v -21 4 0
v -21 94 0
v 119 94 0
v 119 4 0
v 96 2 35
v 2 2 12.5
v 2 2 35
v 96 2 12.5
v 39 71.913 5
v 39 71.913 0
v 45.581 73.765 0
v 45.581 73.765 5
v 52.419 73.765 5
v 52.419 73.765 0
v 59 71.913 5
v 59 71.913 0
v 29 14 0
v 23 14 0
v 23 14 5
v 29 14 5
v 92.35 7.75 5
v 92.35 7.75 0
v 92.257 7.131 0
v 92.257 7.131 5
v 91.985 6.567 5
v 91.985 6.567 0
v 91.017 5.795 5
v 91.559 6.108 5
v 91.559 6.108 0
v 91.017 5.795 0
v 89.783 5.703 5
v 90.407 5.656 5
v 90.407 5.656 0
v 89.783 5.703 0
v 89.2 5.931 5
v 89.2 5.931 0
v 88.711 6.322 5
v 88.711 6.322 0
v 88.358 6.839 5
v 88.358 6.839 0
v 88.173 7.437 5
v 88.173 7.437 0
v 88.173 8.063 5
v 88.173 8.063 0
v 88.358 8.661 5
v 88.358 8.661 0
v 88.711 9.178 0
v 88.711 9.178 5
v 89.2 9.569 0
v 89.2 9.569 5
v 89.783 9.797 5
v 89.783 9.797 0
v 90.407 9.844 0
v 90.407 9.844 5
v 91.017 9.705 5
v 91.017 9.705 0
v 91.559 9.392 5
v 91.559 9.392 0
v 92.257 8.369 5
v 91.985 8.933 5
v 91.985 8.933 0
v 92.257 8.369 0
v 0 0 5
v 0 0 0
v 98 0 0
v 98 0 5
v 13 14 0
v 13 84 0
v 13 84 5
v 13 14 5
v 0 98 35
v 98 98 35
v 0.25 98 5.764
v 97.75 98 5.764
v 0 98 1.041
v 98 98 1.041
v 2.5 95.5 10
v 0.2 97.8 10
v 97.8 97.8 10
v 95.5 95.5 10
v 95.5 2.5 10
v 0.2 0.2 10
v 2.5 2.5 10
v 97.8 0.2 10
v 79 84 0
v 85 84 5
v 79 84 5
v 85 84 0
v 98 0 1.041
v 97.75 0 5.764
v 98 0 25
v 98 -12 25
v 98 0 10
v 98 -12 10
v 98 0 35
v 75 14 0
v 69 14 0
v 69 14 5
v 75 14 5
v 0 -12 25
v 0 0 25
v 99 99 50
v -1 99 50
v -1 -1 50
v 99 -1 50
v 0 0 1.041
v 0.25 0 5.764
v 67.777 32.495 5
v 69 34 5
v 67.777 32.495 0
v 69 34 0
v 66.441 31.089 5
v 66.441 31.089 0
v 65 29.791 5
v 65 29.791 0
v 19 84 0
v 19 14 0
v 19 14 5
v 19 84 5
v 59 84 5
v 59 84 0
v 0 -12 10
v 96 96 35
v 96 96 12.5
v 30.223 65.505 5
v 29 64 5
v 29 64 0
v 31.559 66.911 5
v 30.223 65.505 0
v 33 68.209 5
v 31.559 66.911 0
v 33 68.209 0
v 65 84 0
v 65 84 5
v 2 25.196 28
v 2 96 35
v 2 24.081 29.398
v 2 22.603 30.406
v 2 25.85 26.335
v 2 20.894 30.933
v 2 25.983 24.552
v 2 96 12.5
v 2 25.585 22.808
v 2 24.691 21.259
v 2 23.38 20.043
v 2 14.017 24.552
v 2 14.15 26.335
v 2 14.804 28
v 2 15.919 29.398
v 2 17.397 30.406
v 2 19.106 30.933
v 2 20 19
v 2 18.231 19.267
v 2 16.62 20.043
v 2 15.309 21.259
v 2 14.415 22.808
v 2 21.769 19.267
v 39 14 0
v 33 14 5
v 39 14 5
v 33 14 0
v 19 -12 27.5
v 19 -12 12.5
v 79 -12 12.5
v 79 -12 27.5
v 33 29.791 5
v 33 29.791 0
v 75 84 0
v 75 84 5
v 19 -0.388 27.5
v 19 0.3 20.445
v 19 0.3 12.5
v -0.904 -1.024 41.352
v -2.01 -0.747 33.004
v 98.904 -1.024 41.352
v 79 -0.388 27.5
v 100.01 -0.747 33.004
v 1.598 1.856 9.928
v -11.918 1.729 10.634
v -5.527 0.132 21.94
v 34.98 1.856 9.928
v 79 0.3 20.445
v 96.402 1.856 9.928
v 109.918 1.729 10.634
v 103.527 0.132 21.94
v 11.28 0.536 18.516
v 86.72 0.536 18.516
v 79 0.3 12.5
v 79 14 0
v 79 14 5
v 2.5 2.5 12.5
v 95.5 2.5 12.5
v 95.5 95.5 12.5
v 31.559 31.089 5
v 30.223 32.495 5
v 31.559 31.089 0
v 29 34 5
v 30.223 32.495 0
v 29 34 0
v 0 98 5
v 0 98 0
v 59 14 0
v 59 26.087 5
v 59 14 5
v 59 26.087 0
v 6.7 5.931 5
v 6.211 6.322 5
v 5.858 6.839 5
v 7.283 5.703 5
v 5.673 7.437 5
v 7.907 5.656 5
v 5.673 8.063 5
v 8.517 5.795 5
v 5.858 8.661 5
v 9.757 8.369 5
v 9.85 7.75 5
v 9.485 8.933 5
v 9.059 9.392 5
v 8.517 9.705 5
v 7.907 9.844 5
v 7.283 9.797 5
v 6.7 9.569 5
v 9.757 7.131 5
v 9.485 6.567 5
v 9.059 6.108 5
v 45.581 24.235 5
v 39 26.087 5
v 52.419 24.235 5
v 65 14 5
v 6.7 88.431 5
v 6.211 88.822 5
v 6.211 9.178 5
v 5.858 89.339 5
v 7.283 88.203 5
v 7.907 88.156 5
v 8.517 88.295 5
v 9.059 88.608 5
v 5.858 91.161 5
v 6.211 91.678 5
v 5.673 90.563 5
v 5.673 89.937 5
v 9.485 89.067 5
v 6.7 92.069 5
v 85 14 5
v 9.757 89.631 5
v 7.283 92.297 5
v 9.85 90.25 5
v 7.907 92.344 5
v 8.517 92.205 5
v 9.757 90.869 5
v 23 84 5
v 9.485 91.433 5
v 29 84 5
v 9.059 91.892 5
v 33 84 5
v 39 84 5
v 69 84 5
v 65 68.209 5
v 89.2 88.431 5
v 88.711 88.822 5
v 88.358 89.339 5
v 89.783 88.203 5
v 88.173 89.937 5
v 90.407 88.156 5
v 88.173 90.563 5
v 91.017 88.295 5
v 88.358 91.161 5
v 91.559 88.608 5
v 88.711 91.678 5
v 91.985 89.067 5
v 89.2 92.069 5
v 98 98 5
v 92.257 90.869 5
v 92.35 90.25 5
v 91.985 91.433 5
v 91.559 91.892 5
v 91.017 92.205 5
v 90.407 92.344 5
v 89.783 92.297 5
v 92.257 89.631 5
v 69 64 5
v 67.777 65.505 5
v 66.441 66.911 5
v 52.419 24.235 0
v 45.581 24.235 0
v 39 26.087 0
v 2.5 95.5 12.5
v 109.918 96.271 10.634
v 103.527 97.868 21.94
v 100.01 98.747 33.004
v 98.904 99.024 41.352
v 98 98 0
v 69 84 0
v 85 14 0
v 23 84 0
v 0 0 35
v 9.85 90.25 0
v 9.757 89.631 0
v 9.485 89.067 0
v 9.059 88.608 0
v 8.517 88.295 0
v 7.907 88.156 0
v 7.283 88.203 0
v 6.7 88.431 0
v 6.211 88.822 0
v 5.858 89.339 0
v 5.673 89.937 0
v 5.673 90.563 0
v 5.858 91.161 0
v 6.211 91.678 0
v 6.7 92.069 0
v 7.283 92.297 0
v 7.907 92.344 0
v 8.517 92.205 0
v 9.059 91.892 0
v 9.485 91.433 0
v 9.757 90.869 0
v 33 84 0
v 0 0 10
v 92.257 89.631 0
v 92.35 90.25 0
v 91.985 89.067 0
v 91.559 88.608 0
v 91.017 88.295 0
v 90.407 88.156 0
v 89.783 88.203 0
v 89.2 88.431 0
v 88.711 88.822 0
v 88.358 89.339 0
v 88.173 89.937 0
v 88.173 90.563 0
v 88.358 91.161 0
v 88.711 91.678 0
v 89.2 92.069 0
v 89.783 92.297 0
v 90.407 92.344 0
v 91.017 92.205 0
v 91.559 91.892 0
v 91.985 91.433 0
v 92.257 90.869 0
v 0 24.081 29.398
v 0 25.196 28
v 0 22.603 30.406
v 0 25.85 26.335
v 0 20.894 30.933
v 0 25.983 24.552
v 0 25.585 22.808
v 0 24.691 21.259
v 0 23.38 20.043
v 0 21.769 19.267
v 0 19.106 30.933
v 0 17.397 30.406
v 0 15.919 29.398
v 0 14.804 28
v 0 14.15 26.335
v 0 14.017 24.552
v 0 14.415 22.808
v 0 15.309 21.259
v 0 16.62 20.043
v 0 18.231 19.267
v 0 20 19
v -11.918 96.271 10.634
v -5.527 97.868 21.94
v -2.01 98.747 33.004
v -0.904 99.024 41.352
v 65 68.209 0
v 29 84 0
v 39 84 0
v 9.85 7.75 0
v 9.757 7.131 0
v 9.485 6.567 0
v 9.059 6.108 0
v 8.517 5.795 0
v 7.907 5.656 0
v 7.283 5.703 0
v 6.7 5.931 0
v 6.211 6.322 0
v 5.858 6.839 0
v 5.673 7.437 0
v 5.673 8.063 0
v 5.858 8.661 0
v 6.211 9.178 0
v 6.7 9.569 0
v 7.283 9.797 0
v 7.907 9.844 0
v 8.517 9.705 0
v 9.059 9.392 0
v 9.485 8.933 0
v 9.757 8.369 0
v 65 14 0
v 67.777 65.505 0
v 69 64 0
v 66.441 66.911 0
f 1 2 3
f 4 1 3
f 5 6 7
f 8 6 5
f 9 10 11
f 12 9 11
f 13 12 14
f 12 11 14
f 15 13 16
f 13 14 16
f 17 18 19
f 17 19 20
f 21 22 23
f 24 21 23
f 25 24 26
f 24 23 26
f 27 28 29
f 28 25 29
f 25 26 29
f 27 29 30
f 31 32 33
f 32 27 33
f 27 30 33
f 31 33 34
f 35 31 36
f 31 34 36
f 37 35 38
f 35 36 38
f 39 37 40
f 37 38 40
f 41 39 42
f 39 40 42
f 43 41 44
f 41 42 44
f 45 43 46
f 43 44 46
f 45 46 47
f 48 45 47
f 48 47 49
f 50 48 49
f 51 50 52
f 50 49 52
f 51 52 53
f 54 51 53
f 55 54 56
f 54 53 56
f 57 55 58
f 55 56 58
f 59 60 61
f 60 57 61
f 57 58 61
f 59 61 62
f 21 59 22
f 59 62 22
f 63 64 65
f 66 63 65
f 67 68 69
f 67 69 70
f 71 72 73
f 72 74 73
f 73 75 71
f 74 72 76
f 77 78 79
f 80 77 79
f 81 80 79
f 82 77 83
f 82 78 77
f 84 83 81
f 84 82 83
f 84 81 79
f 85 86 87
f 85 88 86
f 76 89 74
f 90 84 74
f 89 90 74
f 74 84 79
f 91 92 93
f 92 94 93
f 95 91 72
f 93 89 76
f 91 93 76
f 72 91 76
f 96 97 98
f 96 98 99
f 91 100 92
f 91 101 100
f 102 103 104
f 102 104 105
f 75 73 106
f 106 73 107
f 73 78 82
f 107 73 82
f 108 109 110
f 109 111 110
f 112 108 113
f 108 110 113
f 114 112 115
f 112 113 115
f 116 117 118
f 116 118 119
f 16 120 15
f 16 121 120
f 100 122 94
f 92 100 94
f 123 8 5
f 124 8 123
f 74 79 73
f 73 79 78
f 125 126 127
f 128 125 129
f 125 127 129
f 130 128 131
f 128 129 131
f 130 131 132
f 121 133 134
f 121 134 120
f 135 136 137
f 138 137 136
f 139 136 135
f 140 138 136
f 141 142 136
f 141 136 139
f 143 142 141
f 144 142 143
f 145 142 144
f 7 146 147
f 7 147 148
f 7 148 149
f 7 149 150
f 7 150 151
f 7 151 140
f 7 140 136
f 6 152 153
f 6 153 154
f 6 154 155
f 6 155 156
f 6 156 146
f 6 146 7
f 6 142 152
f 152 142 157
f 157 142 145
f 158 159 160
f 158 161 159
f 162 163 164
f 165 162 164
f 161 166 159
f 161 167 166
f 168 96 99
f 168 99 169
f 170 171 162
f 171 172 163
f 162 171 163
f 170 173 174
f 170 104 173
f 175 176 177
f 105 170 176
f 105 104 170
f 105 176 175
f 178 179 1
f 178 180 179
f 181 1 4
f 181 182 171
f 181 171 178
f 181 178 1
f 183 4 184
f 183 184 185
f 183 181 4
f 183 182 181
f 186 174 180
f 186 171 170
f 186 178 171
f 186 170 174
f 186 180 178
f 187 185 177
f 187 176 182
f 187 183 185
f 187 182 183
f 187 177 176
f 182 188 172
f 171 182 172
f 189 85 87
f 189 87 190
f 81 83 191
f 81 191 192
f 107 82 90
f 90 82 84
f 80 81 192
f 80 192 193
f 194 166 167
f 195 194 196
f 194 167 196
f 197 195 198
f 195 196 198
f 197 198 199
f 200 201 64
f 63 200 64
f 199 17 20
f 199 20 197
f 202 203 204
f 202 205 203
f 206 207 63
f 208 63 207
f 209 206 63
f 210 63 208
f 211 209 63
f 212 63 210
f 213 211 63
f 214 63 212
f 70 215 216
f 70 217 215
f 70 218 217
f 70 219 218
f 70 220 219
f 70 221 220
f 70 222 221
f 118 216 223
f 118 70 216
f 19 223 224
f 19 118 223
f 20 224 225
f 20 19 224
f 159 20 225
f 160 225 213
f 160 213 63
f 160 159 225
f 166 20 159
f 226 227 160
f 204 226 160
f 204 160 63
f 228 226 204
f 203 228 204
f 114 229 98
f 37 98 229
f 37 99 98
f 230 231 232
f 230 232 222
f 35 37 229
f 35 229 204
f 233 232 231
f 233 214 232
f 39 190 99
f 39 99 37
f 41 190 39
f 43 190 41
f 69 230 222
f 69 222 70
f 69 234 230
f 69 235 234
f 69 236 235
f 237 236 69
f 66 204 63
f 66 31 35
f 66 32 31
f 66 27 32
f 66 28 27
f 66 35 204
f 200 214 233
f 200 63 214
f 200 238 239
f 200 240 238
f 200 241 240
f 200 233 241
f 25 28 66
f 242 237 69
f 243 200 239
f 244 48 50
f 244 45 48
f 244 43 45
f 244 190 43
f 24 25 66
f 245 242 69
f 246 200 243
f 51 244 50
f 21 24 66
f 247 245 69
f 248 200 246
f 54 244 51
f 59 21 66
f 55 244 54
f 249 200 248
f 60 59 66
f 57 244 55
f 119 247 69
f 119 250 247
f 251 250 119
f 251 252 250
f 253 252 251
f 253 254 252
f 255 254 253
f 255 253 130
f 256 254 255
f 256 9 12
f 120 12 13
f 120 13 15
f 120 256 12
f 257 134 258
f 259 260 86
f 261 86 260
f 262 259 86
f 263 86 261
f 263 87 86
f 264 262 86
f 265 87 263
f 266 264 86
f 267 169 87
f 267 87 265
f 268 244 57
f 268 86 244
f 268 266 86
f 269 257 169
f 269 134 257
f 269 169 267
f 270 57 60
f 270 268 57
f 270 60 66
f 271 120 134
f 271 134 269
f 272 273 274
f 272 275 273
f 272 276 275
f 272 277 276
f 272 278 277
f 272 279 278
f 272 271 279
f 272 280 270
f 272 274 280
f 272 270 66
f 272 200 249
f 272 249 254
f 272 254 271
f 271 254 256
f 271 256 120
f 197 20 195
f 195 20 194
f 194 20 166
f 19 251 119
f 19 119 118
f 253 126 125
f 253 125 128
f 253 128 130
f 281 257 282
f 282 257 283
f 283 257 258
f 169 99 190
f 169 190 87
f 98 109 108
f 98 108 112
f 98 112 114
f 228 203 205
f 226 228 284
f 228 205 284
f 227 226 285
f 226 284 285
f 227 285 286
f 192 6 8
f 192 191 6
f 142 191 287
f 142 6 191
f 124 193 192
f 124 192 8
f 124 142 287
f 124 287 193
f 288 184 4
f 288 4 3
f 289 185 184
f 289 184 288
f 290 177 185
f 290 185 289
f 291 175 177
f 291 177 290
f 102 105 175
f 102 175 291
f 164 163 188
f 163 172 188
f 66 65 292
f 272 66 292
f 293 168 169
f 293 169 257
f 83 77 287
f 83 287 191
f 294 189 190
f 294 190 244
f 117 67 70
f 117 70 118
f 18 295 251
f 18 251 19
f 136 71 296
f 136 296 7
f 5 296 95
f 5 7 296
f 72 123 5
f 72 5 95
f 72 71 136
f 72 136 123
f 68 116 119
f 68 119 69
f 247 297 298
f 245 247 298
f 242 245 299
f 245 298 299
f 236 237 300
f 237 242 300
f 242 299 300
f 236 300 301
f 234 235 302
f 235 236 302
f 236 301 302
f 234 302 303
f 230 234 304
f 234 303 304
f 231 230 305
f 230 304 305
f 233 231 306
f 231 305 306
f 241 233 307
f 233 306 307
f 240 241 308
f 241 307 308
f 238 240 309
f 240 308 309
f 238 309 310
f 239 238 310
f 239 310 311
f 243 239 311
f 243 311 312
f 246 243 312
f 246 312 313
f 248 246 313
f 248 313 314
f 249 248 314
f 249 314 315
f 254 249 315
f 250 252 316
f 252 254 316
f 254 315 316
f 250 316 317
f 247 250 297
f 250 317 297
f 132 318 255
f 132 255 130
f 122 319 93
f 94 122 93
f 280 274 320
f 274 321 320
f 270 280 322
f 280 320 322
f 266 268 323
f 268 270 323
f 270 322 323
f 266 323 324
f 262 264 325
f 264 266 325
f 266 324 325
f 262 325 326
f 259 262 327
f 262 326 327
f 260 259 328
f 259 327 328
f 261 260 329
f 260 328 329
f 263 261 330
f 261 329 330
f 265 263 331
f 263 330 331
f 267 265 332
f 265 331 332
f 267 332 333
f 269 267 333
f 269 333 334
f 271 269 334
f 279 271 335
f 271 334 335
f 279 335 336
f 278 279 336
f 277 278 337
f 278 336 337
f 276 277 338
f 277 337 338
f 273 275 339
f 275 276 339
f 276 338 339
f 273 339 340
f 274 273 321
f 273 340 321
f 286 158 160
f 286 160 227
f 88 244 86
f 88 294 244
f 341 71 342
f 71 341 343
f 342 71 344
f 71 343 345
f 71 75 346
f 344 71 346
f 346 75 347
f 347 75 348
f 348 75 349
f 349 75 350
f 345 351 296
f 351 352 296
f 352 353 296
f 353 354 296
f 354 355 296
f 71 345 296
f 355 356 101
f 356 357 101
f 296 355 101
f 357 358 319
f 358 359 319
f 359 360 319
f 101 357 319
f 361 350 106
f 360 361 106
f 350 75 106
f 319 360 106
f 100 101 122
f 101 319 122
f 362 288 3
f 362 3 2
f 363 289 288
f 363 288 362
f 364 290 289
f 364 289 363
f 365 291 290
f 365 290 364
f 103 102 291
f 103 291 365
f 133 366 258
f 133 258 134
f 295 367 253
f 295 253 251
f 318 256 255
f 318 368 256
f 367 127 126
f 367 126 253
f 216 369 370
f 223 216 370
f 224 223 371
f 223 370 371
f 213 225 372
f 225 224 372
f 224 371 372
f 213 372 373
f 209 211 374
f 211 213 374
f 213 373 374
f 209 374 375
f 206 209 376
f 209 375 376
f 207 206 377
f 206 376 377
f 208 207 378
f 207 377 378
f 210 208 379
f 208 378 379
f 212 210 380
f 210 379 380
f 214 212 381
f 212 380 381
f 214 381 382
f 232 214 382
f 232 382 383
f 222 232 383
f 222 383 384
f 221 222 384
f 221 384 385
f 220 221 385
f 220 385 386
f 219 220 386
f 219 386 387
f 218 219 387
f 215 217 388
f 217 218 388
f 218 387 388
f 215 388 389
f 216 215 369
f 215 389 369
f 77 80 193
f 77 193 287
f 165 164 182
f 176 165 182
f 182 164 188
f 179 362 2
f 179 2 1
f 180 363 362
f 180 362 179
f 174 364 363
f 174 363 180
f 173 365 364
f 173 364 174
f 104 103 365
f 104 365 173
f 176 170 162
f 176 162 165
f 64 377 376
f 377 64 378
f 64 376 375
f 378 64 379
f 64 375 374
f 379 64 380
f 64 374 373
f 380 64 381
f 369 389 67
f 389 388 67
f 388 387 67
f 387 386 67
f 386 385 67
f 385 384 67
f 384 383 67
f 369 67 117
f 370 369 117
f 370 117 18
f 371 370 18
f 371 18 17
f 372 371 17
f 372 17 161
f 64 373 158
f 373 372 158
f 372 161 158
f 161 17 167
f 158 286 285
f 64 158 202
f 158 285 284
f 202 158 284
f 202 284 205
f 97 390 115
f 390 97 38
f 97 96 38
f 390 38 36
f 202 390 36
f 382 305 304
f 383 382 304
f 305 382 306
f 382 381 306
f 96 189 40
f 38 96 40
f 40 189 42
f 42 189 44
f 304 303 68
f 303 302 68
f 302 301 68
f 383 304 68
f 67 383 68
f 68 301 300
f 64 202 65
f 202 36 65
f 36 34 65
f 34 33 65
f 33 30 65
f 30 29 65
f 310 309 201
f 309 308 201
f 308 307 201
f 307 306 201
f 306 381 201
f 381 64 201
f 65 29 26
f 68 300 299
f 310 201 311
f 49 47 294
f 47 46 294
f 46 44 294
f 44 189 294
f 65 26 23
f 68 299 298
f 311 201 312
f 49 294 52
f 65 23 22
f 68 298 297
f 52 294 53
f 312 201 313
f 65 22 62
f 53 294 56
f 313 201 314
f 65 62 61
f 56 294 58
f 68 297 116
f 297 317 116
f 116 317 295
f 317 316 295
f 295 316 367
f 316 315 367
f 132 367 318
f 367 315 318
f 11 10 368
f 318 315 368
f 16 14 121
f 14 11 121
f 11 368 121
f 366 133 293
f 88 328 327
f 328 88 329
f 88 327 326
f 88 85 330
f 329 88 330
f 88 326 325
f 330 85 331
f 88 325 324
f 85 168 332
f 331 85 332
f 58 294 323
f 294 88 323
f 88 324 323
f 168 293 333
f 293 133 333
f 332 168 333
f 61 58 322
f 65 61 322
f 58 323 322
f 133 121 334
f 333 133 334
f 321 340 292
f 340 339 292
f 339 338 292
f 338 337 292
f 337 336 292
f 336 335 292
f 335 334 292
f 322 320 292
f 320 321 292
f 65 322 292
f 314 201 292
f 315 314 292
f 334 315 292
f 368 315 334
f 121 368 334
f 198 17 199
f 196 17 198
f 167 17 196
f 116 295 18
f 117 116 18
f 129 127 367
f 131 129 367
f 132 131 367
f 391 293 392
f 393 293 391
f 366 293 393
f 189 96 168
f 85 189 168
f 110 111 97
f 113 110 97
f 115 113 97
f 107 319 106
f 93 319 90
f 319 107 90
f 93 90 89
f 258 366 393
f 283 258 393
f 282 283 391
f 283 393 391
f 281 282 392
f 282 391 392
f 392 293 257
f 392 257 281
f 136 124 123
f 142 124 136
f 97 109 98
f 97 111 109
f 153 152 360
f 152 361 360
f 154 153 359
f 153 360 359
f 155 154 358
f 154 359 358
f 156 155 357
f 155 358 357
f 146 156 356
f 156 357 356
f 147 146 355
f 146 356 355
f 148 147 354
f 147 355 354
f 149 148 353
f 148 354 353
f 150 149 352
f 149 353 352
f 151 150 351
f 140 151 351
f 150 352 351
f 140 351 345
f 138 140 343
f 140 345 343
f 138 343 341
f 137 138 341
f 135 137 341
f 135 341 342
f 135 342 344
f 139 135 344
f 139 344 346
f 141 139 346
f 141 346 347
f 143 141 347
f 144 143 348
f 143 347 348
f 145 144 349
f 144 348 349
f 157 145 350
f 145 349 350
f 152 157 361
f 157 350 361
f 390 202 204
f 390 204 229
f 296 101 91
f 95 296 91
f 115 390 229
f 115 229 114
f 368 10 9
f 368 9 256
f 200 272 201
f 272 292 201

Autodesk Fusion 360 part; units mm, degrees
sketch "Sketch1" plane through (0, 0, 0) normal (0, 0, 1) x (1, 0, 0) in component "Body Tube"
  line L0 (0, 0) -> (98, 0)
  line L1 (98, 0) -> (98, 98)
  line L2 (98, 98) -> (0, 98)
  line L3 (0, 98) -> (0, 0)
extrude "Extrude1" add sketch "Sketch1" along normal blind 35 makes body 1 in component "Body Tube"
sketch "Sketch2" plane through (0, 0, 0) normal (0, 0, 1) x (1, 0, 0) in component "Body Tube"
  line L0 (2, 2) -> (96, 2)
  line L1 (96, 2) -> (96, 96)
  line L2 (96, 96) -> (2, 96)
  line L3 (2, 96) -> (2, 2)
extrude "Extrude2" cut sketch "Sketch2" along normal blind 7 bodies 1 in component "Body Tube"
ref_plane "WorkPlane1" through (0, 0, 7) normal (0, 0, 1) x (1, 0, 0) in component "Body Tube"
sketch "Sketch3" plane through (0, 0, 7) normal (0, 0, 1) x (1, 0, 0) in component "Body Tube"
  line L0 (2.5, 2.5) -> (95.5, 2.5)
  line L1 (95.5, 2.5) -> (95.5, 95.5)
  line L2 (95.5, 95.5) -> (2.5, 95.5)
  line L3 (2.5, 95.5) -> (2.5, 2.5)
extrude "Extrude3" cut sketch "Sketch3" along normal blind 5.5 bodies 1 in component "Body Tube"
ref_plane "WorkPlane2" through (0, 0, 12.5) normal (0, 0, 1) x (1, 0, 0) in component "Body Tube"
sketch "Sketch4" plane through (0, 0, 12.5) normal (0, 0, 1) x (1, 0, 0) in component "Body Tube"
  line L0 (2, 2) -> (96, 2)
  line L1 (96, 2) -> (96, 96)
  line L2 (96, 96) -> (2, 96)
  line L3 (2, 96) -> (2, 2)
extrude "Extrude4" cut sketch "Sketch4" along normal blind 22.5 bodies 1 in component "Body Tube"
sketch "Sketch5" plane through (0, 0, 0) normal (1, 0, 0) x (0, 0, -1) in component "Body Tube"
  circle A0 centre (-25, 20) radius 6
extrude "Extrude5" cut sketch "Sketch5" along normal mid plane 6 bodies 1 in component "Body Tube"
ref_plane "WorkPlane3" through (0, 0, 10) normal (0, 0, 1) x (1, 0, 0) in component "Body Tube"
sketch "Sketch6" plane through (0, 0, 10) normal (0, 0, 1) x (1, 0, 0) in component "Body Tube"
  line L0 (0, -12) -> (98, -12)
  line L1 (98, -12) -> (98, 0.3)
  line L2 (98, 0.3) -> (0, 0.3)
  line L3 (0, 0.3) -> (0, -12)
extrude "Extrude6" add sketch "Sketch6" along normal blind 15 bodies 1 in component "Body Tube"
ref_plane "WorkPlane1" through (0, 0, 40) normal (0, 0, 1) x (1, 0, 0) in component "Hood"
ref_plane "WorkPlane2" through (0, 0, 50) normal (0, 0, 1) x (1, 0, 0) in component "Hood"
sketch "Sketch1 (2)" plane through (0, 0, 0) normal (0, 0, 1) x (1, 0, 0) in component "Hood"
  line L0 (-21, 4) -> (119, 4)
  line L1 (119, 4) -> (119, 94)
  line L2 (119, 94) -> (-21, 94)
  line L3 (-21, 94) -> (-21, 4)
sketch "Sketch2 (2)" plane through (0, 0, 40) normal (0, 0, 1) x (1, 0, 0) in component "Hood"
  line L0 (-1, -1) -> (99, -1)
  line L1 (99, -1) -> (99, 99)
  line L2 (99, 99) -> (-1, 99)
  line L3 (-1, 99) -> (-1, -1)
sketch "Sketch3 (2)" plane through (0, 0, 50) normal (0, 0, 1) x (1, 0, 0) in component "Hood"
  line L0 (-1, -1) -> (99, -1)
  line L1 (99, -1) -> (99, 99)
  line L2 (99, 99) -> (-1, 99)
  line L3 (-1, 99) -> (-1, -1)
loft "Loft1" add profiles "Sketch1 (2)", "Sketch2 (2)", "Sketch3 (2)" section 1 section 2 section 3 separate body makes body 2 in component "Hood"
sketch "Sketch4 (2)" plane through (0, 0, 0) normal (0, 0, 1) x (1, 0, 0) in component "Hood"
  line L0 (-19, 6) -> (117, 6)
  line L1 (117, 6) -> (117, 92)
  line L2 (117, 92) -> (-19, 92)
  line L3 (-19, 92) -> (-19, 6)
sketch "Sketch5 (2)" plane through (0, 0, 40) normal (0, 0, 1) x (1, 0, 0) in component "Hood"
  line L0 (-0.1, -0.1) -> (98.1, -0.1)
  line L1 (98.1, -0.1) -> (98.1, 98.1)
  line L2 (98.1, 98.1) -> (-0.1, 98.1)
  line L3 (-0.1, 98.1) -> (-0.1, -0.1)
sketch "Sketch6 (2)" plane through (0, 0, 50) normal (0, 0, 1) x (1, 0, 0) in component "Hood"
  line L0 (0.2, 0.2) -> (97.8, 0.2)
  line L1 (97.8, 0.2) -> (97.8, 97.8)
  line L2 (97.8, 97.8) -> (0.2, 97.8)
  line L3 (0.2, 97.8) -> (0.2, 0.2)
loft "Loft1'" cut profiles "Sketch4 (2)", "Sketch5 (2)", "Sketch6 (2)" section 1 sketch seen with x (1, 0, 0) y (0, 1, 0) z (0, 0, 1) at (0, 0, -40) section 2 sketch seen with x (1, 0, 0) y (0, 1, 0) z (0, 0, 1) at (0, 0, -40) section 3 sketch seen with x (1, 0, 0) y (0, 1, 0) z (0, 0, 1) at (0, 0, -40) bodies 1 in component "Body Tube"
ref_plane "WorkPlane3" through (0, 0, 12.5) normal (0, 0, 1) x (1, 0, 0) in component "Hood"
sketch "Sketch7" plane through (0, 0, 12.5) normal (0, 0, 1) x (1, 0, 0) in component "Hood"
  line L0 (19, -12) -> (79, -12)
  line L1 (79, -12) -> (79, 0.3)
  line L2 (79, 0.3) -> (19, 0.3)
  line L3 (19, 0.3) -> (19, -12)
extrude "Extrude1'" add sketch "Sketch7" along normal blind 15 bodies 2 in component "Hood"
sketch "Sketch1 (3)" plane through (0, 0, 0) normal (0, 0, 1) x (1, 0, 0) in component "Back Plate"
  line L0 (0, 0) -> (98, 0)
  line L1 (98, 0) -> (98, 98)
  line L2 (98, 98) -> (0, 98)
  line L3 (0, 98) -> (0, 0)
extrude "Extrude1''" add sketch "Sketch1 (3)" along normal blind 5 separate body makes body 3 in component "Back Plate"
sketch "Sketch2 (3)" plane through (0, 0, 0) normal (0, 0, 1) x (1, 0, 0) in component "Back Plate"
  circle A0 centre (7.75, 7.75) radius 2.1
extrude "Extrude2'" cut sketch "Sketch2 (3)" along normal blind 5 bodies 3 in component "Back Plate"
sketch "Sketch3 (3)" plane through (0, 0, 0) normal (0, 0, 1) x (1, 0, 0) in component "Back Plate"
  circle A0 centre (7.75, 90.25) radius 2.1
extrude "Extrude3'" cut sketch "Sketch3 (3)" along normal blind 5 bodies 3 in component "Back Plate"
sketch "Sketch4 (3)" plane through (0, 0, 0) normal (0, 0, 1) x (1, 0, 0) in component "Back Plate"
  circle A0 centre (90.25, 7.75) radius 2.1
extrude "Extrude4'" cut sketch "Sketch4 (3)" along normal blind 5 bodies 3 in component "Back Plate"
sketch "Sketch5 (3)" plane through (0, 0, 0) normal (0, 0, 1) x (1, 0, 0) in component "Back Plate"
  circle A0 centre (90.25, 90.25) radius 2.1
extrude "Extrude5'" cut sketch "Sketch5 (3)" along normal blind 5 bodies 3 in component "Back Plate"
sketch "Sketch6 (3)" plane through (0, 0, 0) normal (0, 0, 1) x (1, 0, 0) in component "Back Plate"
  circle A0 centre (49, 49) radius 25
extrude "Extrude6'" cut sketch "Sketch6 (3)" along normal blind 5 bodies 3 in component "Back Plate"
sketch "Sketch7 (2)" plane through (0, 0, 0) normal (0, 0, 1) x (1, 0, 0) in component "Back Plate"
  line L0 (13, 14) -> (19, 14)
  line L1 (19, 14) -> (19, 84)
  line L2 (19, 84) -> (13, 84)
  line L3 (13, 84) -> (13, 14)
extrude "Extrude7" cut sketch "Sketch7 (2)" along normal blind 5 bodies 3 in component "Back Plate"
sketch "Sketch8" plane through (0, 0, 0) normal (0, 0, 1) x (1, 0, 0) in component "Back Plate"
  line L0 (23, 14) -> (29, 14)
  line L1 (29, 14) -> (29, 84)
  line L2 (29, 84) -> (23, 84)
  line L3 (23, 84) -> (23, 14)
extrude "Extrude8" cut sketch "Sketch8" along normal blind 5 bodies 3 in component "Back Plate"
sketch "Sketch9" plane through (0, 0, 0) normal (0, 0, 1) x (1, 0, 0) in component "Back Plate"
  line L0 (33, 14) -> (39, 14)
  line L1 (39, 14) -> (39, 84)
  line L2 (39, 84) -> (33, 84)
  line L3 (33, 84) -> (33, 14)
extrude "Extrude9" cut sketch "Sketch9" along normal blind 5 bodies 3 in component "Back Plate"
sketch "Sketch10" plane through (0, 0, 0) normal (0, 0, 1) x (1, 0, 0) in component "Back Plate"
  line L0 (59, 14) -> (65, 14)
  line L1 (65, 14) -> (65, 84)
  line L2 (65, 84) -> (59, 84)
  line L3 (59, 84) -> (59, 14)
extrude "Extrude10" cut sketch "Sketch10" along normal blind 5 bodies 3 in component "Back Plate"
sketch "Sketch11" plane through (0, 0, 0) normal (0, 0, 1) x (1, 0, 0) in component "Back Plate"
  line L0 (69, 14) -> (75, 14)
  line L1 (75, 14) -> (75, 84)
  line L2 (75, 84) -> (69, 84)
  line L3 (69, 84) -> (69, 14)
extrude "Extrude11" cut sketch "Sketch11" along normal blind 5 bodies 3 in component "Back Plate"
sketch "Sketch12" plane through (0, 0, 0) normal (0, 0, 1) x (1, 0, 0) in component "Back Plate"
  line L0 (79, 14) -> (85, 14)
  line L1 (85, 14) -> (85, 84)
  line L2 (85, 84) -> (79, 84)
  line L3 (79, 84) -> (79, 14)
extrude "Extrude12" cut sketch "Sketch12" along normal blind 5 bodies 3 in component "Back Plate"
component "Body Tube" placed x (1, 0, 0) y (0, 1, 0) z (0, 0, 1) at (0, 0, 0)
component "Hood" placed x (1, 0, 0) y (0, 1, 0) z (0, 0, 1) at (0, 0, 0)
component "Back Plate" placed x (1, 0, 0) y (0, 1, 0) z (0, 0, 1) at (0, 0, 0)
